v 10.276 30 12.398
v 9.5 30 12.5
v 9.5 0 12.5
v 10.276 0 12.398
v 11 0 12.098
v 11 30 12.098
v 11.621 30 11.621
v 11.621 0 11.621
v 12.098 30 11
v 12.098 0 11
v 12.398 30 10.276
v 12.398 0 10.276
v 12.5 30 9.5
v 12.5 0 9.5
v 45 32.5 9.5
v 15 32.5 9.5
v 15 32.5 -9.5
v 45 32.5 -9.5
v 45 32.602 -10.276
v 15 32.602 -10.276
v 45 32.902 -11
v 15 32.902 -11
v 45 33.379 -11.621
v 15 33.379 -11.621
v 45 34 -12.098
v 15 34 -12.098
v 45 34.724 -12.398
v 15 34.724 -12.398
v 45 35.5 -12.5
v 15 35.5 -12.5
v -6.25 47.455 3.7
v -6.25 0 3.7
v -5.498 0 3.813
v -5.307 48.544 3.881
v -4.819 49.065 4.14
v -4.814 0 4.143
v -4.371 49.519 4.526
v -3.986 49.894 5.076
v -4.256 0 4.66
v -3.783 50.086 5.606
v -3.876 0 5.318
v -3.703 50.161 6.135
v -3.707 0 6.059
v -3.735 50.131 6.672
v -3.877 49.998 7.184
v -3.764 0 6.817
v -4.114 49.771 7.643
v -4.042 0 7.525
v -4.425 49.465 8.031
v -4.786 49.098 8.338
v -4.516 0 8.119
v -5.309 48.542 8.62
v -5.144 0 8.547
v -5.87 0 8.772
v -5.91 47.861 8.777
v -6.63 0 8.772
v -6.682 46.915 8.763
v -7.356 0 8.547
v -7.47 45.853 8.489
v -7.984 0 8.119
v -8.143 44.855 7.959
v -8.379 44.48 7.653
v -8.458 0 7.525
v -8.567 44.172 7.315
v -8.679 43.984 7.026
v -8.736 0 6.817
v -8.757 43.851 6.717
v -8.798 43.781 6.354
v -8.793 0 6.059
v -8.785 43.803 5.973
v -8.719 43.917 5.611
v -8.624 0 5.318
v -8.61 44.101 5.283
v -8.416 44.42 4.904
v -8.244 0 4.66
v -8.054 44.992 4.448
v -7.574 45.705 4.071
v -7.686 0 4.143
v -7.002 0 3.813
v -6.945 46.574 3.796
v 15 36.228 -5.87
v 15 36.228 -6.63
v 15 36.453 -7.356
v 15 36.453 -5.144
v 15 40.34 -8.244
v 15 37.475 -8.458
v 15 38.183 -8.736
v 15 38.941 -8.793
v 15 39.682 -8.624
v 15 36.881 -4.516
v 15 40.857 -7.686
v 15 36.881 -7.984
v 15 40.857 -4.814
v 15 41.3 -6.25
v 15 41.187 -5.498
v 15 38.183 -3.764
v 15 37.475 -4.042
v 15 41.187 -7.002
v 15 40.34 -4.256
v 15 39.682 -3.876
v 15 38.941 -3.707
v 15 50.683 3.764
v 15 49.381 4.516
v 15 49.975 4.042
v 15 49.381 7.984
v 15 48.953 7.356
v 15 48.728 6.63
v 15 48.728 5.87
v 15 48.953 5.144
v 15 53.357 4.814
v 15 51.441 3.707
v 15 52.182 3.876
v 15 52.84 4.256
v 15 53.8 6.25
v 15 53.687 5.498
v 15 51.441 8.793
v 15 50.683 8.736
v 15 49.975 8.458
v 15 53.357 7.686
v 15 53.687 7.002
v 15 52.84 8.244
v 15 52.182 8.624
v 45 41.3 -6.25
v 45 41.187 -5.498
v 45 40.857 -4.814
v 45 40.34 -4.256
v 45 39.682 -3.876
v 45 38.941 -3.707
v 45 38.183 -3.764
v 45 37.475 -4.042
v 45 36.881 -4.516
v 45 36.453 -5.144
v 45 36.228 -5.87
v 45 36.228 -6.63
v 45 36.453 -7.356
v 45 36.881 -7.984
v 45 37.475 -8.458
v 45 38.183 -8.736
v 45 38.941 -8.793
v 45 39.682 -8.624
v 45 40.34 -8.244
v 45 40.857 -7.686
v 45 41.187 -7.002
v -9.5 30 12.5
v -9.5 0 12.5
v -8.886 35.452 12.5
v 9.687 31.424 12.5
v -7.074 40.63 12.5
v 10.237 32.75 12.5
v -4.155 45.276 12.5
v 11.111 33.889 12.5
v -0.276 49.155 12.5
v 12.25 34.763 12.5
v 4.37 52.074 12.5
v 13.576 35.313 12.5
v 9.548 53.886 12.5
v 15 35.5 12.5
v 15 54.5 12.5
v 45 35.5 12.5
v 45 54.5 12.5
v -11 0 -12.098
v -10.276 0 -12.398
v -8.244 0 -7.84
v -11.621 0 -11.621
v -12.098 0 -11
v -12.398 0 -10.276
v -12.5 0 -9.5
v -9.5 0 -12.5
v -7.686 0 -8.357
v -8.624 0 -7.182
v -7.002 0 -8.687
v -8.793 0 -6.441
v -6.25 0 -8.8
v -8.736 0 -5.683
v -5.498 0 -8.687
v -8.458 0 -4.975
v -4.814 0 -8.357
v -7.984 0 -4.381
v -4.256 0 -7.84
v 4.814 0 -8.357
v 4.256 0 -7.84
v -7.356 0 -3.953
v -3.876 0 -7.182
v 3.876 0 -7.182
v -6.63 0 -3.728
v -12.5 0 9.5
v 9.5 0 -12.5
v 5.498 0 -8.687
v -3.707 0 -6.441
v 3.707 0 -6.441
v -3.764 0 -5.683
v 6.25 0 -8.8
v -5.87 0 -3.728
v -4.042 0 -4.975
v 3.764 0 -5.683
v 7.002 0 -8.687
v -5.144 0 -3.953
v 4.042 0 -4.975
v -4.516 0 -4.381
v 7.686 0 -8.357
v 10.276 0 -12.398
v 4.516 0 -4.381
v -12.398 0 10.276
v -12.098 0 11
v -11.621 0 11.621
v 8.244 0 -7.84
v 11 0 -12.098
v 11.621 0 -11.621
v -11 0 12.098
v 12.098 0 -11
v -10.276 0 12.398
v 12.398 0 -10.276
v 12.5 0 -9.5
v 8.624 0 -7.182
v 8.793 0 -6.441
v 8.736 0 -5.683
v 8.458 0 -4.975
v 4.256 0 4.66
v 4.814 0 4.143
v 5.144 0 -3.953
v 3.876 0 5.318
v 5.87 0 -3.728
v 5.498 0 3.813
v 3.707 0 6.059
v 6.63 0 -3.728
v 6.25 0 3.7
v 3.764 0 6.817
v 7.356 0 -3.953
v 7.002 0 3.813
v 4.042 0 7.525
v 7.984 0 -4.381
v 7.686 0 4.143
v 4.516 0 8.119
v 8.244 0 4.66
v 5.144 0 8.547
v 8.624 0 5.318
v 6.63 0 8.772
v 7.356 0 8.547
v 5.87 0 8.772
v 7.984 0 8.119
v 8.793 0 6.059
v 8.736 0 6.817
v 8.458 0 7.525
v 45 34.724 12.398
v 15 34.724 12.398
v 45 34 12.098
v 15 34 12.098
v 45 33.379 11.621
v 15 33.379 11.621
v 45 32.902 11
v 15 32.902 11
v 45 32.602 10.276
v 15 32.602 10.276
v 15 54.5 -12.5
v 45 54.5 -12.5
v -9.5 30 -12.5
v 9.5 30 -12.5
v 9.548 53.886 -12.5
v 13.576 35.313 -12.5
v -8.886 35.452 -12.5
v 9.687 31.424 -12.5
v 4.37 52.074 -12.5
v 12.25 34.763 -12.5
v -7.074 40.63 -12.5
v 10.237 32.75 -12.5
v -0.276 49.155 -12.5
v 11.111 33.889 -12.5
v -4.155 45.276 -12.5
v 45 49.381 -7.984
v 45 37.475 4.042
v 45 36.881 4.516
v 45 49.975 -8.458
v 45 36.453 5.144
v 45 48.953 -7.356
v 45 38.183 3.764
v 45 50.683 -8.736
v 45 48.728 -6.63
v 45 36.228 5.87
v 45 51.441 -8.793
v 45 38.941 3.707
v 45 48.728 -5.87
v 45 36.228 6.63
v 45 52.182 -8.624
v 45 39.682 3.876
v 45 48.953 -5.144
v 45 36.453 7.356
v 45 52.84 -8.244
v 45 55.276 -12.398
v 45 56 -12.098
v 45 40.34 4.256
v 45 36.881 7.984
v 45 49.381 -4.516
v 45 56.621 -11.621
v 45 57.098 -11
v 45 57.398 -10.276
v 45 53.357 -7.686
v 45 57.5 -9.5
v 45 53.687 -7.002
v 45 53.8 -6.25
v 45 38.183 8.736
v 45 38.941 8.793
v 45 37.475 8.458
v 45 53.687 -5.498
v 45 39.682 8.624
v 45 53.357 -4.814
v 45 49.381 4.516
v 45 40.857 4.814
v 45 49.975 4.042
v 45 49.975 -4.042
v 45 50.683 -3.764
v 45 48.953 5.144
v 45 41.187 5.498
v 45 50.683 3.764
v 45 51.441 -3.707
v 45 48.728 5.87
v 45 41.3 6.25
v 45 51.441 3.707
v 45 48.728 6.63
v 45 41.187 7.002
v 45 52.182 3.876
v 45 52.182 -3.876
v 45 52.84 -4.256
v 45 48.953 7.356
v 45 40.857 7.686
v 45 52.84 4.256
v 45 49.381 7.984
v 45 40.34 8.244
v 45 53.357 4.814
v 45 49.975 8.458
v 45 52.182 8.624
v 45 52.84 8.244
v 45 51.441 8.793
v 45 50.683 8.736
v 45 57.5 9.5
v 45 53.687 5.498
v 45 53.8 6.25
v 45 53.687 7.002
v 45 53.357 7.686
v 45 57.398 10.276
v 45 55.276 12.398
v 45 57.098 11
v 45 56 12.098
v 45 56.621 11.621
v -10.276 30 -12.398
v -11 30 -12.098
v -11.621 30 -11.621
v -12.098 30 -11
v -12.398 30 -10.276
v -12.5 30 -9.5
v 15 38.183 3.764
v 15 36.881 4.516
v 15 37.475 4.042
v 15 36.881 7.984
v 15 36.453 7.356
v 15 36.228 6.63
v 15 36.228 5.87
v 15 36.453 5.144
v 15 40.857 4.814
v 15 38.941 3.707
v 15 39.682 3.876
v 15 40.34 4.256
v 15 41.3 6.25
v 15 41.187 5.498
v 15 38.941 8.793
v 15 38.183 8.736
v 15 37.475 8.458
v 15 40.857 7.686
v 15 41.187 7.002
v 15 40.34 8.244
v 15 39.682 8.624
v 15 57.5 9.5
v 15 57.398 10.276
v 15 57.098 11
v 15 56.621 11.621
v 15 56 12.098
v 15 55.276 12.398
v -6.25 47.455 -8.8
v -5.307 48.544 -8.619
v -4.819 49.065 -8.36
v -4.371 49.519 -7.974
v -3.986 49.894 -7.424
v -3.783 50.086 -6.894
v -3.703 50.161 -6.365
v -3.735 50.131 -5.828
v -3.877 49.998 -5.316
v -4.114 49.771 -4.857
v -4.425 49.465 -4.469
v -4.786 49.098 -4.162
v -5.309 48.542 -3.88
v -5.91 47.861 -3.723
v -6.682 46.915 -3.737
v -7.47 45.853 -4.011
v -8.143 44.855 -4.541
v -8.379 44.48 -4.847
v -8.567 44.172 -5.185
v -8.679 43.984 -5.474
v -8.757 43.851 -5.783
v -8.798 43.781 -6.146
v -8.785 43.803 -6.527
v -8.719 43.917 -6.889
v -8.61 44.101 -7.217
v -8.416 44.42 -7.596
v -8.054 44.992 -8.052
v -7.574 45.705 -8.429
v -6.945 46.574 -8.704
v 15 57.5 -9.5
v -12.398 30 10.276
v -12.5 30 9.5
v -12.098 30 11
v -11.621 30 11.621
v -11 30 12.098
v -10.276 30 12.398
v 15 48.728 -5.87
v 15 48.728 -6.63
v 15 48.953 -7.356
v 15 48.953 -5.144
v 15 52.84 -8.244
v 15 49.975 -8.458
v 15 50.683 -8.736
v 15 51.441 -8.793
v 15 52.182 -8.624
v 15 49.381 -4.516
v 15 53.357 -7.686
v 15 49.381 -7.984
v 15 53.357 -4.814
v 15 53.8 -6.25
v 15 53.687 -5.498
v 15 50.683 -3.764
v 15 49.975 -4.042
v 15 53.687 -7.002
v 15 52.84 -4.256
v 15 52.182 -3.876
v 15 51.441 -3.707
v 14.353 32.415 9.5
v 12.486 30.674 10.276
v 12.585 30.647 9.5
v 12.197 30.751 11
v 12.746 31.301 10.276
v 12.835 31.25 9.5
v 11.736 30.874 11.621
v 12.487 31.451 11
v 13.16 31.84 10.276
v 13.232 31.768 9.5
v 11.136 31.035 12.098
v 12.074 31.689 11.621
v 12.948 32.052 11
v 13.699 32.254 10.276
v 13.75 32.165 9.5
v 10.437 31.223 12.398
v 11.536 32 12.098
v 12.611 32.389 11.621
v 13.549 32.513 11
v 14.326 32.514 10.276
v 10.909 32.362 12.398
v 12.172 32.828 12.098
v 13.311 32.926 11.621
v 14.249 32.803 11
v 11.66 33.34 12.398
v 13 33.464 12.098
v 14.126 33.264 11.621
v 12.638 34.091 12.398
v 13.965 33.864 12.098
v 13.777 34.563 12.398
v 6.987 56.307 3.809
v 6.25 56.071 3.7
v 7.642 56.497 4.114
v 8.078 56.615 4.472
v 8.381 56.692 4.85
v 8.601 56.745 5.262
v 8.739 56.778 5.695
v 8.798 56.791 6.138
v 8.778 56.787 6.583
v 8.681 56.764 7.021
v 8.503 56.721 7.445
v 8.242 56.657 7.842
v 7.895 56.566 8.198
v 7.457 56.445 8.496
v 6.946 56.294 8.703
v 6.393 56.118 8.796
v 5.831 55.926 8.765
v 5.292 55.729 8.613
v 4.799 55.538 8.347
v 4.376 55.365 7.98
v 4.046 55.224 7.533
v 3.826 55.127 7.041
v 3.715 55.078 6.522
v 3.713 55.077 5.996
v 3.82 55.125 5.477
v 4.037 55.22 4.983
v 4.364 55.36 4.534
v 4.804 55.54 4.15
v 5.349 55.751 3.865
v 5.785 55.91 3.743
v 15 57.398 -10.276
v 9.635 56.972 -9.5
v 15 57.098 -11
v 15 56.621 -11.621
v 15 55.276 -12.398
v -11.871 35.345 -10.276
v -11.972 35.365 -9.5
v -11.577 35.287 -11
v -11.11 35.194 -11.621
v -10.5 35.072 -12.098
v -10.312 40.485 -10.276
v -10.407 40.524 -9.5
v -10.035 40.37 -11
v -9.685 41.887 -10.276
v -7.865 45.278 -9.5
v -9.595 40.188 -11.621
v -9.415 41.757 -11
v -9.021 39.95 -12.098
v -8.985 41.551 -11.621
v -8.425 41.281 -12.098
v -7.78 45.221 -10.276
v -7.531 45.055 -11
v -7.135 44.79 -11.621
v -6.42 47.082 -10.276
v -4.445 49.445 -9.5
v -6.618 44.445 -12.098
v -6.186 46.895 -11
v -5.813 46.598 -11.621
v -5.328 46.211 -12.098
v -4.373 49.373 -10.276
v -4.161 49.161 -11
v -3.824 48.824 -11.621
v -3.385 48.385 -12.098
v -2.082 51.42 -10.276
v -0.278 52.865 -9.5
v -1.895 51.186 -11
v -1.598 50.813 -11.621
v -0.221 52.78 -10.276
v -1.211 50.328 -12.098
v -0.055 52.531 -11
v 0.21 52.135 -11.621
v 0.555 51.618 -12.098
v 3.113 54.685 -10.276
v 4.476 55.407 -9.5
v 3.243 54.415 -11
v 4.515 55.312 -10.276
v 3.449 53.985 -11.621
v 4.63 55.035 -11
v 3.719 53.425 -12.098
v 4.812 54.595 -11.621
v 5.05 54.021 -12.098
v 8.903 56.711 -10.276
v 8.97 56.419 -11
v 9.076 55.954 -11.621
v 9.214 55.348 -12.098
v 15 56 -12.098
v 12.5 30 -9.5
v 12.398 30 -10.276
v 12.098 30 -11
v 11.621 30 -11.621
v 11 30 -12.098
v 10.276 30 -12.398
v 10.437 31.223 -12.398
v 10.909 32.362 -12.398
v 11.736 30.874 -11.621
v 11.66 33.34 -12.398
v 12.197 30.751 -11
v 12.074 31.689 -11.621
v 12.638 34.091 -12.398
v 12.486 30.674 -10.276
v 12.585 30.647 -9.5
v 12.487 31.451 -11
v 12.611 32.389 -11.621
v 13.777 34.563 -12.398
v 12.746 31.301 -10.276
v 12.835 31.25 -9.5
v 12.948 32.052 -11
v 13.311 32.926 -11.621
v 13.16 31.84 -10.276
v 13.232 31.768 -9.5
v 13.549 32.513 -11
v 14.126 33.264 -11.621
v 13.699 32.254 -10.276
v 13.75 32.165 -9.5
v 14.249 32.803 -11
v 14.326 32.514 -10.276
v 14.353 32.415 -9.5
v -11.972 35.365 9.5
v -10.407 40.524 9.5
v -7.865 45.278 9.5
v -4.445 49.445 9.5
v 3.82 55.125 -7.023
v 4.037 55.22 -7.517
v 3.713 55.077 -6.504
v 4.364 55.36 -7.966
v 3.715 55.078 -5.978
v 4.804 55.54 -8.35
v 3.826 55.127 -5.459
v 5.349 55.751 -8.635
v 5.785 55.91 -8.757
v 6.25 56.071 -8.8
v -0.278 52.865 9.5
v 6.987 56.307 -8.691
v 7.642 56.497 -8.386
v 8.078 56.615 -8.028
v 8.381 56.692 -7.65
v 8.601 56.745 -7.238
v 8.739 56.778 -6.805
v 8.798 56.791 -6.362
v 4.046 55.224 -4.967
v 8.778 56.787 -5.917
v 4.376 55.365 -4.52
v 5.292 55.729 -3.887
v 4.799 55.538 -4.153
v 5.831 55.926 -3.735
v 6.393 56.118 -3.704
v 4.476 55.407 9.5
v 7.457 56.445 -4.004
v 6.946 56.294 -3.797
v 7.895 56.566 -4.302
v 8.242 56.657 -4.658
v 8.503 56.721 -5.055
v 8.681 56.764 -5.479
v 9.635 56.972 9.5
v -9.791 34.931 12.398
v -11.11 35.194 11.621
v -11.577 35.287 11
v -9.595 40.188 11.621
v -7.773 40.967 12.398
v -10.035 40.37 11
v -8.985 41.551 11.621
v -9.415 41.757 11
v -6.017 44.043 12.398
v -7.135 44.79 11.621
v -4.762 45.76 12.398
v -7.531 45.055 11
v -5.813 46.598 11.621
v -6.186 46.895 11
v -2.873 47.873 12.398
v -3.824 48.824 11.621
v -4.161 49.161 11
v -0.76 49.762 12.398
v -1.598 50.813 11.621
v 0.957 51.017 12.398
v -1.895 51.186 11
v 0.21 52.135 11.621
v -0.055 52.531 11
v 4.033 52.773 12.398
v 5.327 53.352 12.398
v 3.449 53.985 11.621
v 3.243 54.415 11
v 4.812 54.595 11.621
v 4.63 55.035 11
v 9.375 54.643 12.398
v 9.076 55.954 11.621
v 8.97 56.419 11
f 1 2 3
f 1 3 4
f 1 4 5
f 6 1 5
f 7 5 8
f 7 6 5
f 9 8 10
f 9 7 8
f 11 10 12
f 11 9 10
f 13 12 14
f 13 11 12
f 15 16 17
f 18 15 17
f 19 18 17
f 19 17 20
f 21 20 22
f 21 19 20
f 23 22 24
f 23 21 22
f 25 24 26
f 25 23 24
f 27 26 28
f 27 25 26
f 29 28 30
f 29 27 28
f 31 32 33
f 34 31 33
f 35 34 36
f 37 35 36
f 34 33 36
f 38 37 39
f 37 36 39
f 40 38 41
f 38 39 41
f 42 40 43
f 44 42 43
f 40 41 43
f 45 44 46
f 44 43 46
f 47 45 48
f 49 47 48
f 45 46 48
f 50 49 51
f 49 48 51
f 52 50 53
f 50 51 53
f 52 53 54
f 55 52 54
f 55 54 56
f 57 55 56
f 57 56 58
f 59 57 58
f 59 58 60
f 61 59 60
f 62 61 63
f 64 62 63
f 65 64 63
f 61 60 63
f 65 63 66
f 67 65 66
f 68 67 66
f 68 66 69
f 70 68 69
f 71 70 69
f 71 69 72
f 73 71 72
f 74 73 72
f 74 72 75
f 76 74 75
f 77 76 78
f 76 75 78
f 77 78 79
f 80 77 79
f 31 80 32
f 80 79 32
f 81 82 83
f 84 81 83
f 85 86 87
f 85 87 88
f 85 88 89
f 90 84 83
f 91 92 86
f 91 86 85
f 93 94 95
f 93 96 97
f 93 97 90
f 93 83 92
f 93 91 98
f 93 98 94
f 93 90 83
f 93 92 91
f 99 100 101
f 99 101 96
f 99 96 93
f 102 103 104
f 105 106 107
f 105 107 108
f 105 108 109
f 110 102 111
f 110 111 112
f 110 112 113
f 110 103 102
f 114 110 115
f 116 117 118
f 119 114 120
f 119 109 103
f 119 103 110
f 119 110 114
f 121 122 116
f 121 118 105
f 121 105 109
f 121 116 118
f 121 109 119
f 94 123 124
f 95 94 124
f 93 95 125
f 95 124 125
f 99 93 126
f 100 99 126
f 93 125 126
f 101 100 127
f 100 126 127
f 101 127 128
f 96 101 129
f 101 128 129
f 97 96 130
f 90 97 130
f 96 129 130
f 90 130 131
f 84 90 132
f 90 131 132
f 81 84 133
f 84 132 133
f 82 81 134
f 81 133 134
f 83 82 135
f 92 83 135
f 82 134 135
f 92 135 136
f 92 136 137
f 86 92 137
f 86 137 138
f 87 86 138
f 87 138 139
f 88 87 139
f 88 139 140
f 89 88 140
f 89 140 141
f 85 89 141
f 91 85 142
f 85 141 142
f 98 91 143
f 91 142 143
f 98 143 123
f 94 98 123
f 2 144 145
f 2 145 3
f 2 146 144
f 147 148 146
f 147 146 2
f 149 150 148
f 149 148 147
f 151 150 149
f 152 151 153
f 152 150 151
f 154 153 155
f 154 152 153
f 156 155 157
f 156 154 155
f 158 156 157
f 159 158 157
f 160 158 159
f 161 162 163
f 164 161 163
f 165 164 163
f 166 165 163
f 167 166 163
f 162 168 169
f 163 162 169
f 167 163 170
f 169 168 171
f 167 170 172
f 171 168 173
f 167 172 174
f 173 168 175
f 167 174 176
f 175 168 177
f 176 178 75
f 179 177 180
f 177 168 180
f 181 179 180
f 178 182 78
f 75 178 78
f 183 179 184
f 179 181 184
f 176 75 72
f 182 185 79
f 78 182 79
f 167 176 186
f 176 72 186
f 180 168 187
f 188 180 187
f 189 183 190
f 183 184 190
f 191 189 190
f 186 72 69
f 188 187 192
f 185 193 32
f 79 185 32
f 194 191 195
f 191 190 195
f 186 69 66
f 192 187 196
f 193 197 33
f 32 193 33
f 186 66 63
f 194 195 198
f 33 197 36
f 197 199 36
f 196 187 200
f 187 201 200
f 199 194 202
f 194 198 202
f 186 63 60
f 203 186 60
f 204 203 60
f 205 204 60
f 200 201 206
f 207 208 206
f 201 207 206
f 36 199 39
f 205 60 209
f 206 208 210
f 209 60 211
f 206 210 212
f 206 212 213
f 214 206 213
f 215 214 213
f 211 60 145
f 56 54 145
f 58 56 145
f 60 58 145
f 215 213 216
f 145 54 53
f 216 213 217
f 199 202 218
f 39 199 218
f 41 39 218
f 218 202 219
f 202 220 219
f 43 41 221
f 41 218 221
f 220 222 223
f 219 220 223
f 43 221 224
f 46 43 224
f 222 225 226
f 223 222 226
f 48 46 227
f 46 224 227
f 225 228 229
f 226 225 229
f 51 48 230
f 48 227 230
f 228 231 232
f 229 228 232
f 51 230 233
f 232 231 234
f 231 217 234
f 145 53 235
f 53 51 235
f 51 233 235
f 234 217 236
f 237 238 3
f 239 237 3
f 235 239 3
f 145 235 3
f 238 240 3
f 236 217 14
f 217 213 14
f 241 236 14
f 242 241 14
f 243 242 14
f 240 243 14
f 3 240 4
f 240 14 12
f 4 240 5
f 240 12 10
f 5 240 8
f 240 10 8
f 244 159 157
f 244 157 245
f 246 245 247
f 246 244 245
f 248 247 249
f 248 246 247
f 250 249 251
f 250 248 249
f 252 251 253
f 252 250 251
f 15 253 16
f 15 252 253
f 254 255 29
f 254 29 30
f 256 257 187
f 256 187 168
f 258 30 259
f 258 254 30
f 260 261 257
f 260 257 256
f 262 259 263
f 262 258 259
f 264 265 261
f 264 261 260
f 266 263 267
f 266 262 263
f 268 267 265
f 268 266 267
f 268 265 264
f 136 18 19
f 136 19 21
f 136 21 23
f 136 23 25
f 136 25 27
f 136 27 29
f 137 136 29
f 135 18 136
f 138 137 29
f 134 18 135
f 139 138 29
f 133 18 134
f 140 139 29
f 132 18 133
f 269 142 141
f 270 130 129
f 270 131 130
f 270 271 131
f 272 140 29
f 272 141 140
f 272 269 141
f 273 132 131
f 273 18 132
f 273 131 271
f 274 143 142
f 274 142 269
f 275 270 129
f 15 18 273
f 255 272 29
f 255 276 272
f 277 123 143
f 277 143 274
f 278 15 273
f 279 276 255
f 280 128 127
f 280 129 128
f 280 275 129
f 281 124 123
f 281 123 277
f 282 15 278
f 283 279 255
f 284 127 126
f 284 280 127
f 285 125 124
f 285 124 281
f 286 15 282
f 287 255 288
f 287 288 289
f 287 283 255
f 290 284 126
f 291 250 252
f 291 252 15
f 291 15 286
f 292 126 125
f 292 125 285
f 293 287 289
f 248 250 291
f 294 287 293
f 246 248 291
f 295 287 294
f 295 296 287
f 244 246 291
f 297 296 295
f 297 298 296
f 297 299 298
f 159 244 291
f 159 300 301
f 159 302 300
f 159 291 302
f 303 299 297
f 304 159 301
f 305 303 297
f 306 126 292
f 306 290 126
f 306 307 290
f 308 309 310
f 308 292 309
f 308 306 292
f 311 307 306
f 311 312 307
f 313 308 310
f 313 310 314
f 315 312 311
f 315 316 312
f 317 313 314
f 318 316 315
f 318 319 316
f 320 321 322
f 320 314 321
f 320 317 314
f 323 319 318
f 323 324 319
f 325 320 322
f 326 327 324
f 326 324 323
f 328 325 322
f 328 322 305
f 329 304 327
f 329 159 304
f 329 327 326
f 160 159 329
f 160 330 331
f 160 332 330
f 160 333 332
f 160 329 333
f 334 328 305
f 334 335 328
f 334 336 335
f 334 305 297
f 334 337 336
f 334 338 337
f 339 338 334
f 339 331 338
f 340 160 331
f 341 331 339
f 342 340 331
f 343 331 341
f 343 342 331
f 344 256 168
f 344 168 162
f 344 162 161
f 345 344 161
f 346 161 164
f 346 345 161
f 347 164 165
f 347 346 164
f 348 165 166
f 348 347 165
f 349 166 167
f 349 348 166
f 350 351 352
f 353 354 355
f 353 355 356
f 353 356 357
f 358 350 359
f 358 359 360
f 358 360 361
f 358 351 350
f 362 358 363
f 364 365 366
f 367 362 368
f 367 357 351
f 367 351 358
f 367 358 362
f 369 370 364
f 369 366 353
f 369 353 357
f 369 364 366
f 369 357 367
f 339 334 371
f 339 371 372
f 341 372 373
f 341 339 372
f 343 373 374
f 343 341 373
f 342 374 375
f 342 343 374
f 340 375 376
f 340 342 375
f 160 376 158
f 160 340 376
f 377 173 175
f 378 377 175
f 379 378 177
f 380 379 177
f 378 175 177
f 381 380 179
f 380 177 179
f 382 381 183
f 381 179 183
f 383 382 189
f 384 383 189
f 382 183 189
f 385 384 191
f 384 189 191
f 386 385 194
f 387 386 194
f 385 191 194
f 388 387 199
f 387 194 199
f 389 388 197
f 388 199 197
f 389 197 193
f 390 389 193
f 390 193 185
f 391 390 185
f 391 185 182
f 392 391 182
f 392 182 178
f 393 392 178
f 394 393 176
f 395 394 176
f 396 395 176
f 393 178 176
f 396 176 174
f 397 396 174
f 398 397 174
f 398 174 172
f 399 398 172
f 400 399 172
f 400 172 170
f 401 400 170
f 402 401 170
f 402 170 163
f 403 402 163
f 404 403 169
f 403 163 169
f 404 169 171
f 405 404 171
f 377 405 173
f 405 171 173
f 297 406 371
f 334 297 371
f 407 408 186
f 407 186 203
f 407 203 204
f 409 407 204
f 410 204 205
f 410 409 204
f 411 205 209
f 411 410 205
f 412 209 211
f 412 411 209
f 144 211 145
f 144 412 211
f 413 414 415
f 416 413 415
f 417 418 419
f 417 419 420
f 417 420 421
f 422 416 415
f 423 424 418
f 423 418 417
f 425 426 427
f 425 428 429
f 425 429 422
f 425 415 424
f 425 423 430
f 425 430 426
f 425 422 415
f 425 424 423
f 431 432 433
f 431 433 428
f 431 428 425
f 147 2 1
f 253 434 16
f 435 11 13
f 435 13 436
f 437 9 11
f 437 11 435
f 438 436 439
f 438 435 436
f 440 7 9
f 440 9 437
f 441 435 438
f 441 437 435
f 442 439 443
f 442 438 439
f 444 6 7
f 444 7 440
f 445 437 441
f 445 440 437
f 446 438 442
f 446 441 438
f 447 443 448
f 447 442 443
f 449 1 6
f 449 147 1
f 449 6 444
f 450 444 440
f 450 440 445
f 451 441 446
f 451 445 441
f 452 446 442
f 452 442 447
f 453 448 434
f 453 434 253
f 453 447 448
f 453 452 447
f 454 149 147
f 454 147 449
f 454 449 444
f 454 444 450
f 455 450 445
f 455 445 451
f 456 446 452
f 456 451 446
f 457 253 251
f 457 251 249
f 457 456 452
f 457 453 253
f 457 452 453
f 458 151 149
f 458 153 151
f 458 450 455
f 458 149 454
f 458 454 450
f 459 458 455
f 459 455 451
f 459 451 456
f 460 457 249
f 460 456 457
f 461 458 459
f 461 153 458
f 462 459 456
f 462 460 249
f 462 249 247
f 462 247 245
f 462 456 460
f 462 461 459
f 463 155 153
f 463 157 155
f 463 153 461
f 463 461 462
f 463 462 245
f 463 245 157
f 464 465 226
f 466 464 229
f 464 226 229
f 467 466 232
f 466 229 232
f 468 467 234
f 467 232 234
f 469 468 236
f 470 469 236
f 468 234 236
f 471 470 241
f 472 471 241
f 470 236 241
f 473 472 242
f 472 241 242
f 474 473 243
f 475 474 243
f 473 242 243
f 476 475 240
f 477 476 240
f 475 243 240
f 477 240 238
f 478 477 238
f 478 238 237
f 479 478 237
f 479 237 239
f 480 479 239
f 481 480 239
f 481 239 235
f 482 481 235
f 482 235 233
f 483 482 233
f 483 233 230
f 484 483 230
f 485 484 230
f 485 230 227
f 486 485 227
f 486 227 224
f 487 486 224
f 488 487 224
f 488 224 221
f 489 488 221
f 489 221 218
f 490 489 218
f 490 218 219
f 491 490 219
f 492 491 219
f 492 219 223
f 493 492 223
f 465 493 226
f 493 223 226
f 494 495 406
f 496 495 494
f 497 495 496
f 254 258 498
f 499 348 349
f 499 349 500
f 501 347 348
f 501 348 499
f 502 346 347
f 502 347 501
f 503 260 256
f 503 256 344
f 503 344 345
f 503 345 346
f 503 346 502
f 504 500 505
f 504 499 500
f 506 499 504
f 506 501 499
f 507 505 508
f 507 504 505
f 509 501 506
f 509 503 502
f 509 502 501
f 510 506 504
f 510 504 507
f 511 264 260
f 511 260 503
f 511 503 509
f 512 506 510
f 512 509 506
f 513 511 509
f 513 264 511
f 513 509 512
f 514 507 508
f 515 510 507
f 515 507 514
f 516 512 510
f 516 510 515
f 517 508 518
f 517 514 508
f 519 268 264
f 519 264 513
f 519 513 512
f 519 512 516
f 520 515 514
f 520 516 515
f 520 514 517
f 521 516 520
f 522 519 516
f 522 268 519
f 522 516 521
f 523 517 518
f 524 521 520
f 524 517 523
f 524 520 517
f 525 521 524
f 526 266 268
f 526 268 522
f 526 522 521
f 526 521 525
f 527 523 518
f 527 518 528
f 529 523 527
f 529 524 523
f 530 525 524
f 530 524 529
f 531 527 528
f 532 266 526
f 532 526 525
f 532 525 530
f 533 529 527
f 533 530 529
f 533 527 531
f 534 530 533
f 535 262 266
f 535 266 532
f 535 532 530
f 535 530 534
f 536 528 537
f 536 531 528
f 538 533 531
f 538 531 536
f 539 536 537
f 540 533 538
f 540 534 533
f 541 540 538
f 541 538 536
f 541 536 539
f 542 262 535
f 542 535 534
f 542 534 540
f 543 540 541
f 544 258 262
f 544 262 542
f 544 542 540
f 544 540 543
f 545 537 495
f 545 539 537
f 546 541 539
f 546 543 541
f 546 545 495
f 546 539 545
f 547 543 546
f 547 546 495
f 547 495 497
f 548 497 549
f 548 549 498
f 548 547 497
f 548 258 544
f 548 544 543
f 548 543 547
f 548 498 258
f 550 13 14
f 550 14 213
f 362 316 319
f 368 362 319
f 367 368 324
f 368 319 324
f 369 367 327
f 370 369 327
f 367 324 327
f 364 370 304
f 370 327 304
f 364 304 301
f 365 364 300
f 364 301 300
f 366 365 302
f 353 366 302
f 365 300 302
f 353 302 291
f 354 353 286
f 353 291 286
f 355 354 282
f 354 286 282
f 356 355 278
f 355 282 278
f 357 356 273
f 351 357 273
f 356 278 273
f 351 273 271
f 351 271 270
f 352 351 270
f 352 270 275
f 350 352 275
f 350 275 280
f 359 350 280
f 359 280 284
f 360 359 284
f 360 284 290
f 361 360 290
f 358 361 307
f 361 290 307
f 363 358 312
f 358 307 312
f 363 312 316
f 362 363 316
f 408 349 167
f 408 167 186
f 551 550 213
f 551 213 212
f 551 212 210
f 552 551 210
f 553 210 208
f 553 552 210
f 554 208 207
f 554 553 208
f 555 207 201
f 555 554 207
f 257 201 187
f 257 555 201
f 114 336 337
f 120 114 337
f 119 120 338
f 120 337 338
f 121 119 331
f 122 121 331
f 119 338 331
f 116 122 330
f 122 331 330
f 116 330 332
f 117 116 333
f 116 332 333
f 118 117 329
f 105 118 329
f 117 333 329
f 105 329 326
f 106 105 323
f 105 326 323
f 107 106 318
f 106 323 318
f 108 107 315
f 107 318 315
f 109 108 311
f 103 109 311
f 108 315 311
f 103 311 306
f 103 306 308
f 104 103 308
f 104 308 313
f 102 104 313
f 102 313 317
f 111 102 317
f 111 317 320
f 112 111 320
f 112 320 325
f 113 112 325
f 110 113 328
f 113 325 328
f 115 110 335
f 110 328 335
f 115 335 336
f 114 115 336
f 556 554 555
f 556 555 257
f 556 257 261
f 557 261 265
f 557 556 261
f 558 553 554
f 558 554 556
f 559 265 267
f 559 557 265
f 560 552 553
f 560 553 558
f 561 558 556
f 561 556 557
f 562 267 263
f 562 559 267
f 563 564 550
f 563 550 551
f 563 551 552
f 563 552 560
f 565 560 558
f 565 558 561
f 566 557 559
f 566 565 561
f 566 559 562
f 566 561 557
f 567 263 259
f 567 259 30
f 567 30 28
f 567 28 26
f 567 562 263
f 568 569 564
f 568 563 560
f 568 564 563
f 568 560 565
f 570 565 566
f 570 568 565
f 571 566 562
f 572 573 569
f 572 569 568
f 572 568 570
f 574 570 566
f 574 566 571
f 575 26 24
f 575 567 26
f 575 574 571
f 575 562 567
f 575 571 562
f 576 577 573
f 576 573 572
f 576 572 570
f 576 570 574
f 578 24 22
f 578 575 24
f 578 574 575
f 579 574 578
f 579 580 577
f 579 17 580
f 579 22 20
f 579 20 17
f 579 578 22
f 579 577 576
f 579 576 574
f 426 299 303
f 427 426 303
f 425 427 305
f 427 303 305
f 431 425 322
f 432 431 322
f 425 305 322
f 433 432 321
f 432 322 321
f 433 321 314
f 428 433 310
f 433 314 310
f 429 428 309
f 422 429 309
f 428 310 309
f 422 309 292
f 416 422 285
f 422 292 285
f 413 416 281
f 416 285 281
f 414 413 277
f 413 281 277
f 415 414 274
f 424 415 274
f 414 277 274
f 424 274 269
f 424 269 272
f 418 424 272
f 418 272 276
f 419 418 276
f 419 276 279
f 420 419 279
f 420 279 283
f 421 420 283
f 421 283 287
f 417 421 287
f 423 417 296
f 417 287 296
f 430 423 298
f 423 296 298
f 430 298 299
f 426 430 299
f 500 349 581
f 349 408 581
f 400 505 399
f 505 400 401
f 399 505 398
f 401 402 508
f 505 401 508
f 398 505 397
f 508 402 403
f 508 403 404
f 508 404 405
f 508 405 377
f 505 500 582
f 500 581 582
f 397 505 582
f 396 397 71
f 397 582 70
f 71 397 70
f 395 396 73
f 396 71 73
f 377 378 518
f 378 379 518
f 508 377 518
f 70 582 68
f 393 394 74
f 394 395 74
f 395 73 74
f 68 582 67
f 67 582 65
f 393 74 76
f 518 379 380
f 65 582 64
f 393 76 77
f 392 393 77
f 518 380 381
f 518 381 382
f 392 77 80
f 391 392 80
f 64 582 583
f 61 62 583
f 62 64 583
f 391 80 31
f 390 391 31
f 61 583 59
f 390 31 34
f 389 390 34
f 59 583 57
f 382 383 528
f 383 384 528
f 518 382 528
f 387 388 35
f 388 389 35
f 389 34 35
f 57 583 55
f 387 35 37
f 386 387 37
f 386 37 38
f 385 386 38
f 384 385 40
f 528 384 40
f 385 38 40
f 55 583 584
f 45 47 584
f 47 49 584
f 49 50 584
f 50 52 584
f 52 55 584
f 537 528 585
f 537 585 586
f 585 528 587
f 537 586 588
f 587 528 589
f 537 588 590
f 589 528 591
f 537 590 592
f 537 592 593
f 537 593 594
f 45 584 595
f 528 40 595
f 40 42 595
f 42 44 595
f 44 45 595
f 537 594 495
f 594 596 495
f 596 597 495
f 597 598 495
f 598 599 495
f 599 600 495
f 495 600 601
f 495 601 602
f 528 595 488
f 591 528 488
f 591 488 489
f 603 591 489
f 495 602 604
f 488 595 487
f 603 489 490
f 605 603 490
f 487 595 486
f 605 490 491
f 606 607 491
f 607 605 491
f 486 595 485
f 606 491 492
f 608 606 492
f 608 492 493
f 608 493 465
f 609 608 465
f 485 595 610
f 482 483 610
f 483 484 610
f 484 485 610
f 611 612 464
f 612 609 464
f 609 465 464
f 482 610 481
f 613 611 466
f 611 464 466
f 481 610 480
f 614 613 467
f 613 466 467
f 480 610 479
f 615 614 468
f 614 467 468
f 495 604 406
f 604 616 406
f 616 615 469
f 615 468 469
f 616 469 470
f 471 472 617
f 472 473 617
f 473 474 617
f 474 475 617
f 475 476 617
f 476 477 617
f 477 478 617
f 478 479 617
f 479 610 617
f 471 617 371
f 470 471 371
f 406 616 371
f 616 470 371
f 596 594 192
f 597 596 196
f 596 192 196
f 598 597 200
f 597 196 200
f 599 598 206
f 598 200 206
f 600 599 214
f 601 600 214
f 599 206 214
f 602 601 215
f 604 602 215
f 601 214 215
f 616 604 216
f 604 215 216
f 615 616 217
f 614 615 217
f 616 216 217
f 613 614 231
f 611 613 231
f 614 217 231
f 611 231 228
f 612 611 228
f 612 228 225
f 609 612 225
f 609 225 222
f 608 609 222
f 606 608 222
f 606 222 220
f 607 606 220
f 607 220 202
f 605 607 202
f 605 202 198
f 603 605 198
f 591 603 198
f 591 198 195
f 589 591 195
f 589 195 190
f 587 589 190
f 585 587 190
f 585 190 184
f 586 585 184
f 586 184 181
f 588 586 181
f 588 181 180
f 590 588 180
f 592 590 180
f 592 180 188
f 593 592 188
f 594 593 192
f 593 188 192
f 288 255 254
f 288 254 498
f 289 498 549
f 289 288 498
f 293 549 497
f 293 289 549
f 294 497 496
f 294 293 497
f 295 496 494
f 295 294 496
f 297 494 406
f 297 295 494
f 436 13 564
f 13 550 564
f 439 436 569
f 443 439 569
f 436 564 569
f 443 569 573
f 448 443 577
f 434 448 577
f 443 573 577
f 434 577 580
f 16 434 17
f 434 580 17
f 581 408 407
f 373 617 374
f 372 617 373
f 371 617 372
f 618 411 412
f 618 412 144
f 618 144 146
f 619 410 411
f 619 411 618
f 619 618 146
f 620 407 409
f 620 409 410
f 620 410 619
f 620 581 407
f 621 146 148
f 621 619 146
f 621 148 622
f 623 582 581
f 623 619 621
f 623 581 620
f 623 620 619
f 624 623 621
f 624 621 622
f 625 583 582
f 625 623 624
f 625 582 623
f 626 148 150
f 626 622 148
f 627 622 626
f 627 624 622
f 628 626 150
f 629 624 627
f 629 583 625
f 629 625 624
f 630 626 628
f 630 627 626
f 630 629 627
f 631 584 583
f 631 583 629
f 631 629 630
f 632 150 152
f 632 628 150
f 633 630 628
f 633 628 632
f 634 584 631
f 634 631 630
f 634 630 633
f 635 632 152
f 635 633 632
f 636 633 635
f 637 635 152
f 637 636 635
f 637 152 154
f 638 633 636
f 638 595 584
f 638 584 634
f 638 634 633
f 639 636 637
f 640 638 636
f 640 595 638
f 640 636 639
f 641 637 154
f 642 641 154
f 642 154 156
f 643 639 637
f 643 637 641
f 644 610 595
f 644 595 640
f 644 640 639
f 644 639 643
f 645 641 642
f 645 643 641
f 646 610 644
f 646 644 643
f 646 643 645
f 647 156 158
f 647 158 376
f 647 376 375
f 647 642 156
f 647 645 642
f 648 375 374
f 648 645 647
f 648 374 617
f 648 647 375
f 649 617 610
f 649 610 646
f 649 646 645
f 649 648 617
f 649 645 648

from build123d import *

# Parameters (mm, degrees)
SKETCH_3_R          = 2.55
CUT_EXTRUDE_1_DEPTH = 30
SKETCH_5_R          = 2.55
CUT_EXTRUDE_2_DEPTH = 75.077662045


with BuildPart() as part:
    # 扫描1: sweep along a path in 草图2
    with BuildLine(Plane.XY) as sweep_1_path:
        Line((0, 0), (0, 30))
        ThreePointArc((0, 30), (4.393398282, 40.606601718), (15, 45))
        Line((15, 45), (45, 45))
    # 草图1 → 扫描1 (sweep)
    with BuildSketch(Plane(origin=(0, 0, 0), x_dir=(1, 0, 0), z_dir=(0, 1, 0))):
        with BuildLine():
            Line((-9.5, 12.5), (9.5, 12.5))
            ThreePointArc((9.5, 12.5), (11.621320344, 11.621320344), (12.5, 9.5))
            Line((12.5, 9.5), (12.5, -9.5))
            ThreePointArc((12.5, -9.5), (11.621320344, -11.621320344), (9.5, -12.5))
            Line((9.5, -12.5), (-9.5, -12.5))
            ThreePointArc((-9.5, -12.5), (-11.621320344, -11.621320344), (-12.5, -9.5))
            Line((-12.5, -9.5), (-12.5, 9.5))
            ThreePointArc((-12.5, 9.5), (-11.621320344, 11.621320344), (-9.5, 12.5))
        make_face()
    sweep(path=sweep_1_path.line)

    # 草图3 → 切除-拉伸1 (cut)
    with BuildSketch(Plane(origin=(45, 0, 0), x_dir=(0, 0, -1), z_dir=(1, 0, 0))):
        with Locations(Location((6.25, 51.25, 0), (0, 0, 90))):
            Circle(SKETCH_3_R)
        with Locations(Location((6.25, 38.75, 0), (0, 0, 90))):
            Circle(SKETCH_3_R)
        with Locations(Location((-6.25, 38.75, 0), (0, 0, 90))):
            Circle(SKETCH_3_R)
        with Locations(Location((-6.25, 51.25, 0), (0, 0, 90))):
            Circle(SKETCH_3_R)
    extrude(amount=-CUT_EXTRUDE_1_DEPTH, mode=Mode.SUBTRACT)

    # 草图5 → 切除-拉伸2 (cut, through all)
    with BuildSketch(Plane.XZ):
        with Locations(Location((-6.25, 6.25, 0), (0, 0, 270))):
            Circle(SKETCH_5_R)
        with Locations(Location((6.25, 6.25, 0), (0, 0, 270))):
            Circle(SKETCH_5_R)
        with Locations(Location((-6.25, -6.25, 0), (0, 0, 270))):
            Circle(SKETCH_5_R)
        with Locations(Location((6.25, -6.25, 0), (0, 0, 270))):
            Circle(SKETCH_5_R)
    extrude(amount=-CUT_EXTRUDE_2_DEPTH, mode=Mode.SUBTRACT)


solid = part.part
